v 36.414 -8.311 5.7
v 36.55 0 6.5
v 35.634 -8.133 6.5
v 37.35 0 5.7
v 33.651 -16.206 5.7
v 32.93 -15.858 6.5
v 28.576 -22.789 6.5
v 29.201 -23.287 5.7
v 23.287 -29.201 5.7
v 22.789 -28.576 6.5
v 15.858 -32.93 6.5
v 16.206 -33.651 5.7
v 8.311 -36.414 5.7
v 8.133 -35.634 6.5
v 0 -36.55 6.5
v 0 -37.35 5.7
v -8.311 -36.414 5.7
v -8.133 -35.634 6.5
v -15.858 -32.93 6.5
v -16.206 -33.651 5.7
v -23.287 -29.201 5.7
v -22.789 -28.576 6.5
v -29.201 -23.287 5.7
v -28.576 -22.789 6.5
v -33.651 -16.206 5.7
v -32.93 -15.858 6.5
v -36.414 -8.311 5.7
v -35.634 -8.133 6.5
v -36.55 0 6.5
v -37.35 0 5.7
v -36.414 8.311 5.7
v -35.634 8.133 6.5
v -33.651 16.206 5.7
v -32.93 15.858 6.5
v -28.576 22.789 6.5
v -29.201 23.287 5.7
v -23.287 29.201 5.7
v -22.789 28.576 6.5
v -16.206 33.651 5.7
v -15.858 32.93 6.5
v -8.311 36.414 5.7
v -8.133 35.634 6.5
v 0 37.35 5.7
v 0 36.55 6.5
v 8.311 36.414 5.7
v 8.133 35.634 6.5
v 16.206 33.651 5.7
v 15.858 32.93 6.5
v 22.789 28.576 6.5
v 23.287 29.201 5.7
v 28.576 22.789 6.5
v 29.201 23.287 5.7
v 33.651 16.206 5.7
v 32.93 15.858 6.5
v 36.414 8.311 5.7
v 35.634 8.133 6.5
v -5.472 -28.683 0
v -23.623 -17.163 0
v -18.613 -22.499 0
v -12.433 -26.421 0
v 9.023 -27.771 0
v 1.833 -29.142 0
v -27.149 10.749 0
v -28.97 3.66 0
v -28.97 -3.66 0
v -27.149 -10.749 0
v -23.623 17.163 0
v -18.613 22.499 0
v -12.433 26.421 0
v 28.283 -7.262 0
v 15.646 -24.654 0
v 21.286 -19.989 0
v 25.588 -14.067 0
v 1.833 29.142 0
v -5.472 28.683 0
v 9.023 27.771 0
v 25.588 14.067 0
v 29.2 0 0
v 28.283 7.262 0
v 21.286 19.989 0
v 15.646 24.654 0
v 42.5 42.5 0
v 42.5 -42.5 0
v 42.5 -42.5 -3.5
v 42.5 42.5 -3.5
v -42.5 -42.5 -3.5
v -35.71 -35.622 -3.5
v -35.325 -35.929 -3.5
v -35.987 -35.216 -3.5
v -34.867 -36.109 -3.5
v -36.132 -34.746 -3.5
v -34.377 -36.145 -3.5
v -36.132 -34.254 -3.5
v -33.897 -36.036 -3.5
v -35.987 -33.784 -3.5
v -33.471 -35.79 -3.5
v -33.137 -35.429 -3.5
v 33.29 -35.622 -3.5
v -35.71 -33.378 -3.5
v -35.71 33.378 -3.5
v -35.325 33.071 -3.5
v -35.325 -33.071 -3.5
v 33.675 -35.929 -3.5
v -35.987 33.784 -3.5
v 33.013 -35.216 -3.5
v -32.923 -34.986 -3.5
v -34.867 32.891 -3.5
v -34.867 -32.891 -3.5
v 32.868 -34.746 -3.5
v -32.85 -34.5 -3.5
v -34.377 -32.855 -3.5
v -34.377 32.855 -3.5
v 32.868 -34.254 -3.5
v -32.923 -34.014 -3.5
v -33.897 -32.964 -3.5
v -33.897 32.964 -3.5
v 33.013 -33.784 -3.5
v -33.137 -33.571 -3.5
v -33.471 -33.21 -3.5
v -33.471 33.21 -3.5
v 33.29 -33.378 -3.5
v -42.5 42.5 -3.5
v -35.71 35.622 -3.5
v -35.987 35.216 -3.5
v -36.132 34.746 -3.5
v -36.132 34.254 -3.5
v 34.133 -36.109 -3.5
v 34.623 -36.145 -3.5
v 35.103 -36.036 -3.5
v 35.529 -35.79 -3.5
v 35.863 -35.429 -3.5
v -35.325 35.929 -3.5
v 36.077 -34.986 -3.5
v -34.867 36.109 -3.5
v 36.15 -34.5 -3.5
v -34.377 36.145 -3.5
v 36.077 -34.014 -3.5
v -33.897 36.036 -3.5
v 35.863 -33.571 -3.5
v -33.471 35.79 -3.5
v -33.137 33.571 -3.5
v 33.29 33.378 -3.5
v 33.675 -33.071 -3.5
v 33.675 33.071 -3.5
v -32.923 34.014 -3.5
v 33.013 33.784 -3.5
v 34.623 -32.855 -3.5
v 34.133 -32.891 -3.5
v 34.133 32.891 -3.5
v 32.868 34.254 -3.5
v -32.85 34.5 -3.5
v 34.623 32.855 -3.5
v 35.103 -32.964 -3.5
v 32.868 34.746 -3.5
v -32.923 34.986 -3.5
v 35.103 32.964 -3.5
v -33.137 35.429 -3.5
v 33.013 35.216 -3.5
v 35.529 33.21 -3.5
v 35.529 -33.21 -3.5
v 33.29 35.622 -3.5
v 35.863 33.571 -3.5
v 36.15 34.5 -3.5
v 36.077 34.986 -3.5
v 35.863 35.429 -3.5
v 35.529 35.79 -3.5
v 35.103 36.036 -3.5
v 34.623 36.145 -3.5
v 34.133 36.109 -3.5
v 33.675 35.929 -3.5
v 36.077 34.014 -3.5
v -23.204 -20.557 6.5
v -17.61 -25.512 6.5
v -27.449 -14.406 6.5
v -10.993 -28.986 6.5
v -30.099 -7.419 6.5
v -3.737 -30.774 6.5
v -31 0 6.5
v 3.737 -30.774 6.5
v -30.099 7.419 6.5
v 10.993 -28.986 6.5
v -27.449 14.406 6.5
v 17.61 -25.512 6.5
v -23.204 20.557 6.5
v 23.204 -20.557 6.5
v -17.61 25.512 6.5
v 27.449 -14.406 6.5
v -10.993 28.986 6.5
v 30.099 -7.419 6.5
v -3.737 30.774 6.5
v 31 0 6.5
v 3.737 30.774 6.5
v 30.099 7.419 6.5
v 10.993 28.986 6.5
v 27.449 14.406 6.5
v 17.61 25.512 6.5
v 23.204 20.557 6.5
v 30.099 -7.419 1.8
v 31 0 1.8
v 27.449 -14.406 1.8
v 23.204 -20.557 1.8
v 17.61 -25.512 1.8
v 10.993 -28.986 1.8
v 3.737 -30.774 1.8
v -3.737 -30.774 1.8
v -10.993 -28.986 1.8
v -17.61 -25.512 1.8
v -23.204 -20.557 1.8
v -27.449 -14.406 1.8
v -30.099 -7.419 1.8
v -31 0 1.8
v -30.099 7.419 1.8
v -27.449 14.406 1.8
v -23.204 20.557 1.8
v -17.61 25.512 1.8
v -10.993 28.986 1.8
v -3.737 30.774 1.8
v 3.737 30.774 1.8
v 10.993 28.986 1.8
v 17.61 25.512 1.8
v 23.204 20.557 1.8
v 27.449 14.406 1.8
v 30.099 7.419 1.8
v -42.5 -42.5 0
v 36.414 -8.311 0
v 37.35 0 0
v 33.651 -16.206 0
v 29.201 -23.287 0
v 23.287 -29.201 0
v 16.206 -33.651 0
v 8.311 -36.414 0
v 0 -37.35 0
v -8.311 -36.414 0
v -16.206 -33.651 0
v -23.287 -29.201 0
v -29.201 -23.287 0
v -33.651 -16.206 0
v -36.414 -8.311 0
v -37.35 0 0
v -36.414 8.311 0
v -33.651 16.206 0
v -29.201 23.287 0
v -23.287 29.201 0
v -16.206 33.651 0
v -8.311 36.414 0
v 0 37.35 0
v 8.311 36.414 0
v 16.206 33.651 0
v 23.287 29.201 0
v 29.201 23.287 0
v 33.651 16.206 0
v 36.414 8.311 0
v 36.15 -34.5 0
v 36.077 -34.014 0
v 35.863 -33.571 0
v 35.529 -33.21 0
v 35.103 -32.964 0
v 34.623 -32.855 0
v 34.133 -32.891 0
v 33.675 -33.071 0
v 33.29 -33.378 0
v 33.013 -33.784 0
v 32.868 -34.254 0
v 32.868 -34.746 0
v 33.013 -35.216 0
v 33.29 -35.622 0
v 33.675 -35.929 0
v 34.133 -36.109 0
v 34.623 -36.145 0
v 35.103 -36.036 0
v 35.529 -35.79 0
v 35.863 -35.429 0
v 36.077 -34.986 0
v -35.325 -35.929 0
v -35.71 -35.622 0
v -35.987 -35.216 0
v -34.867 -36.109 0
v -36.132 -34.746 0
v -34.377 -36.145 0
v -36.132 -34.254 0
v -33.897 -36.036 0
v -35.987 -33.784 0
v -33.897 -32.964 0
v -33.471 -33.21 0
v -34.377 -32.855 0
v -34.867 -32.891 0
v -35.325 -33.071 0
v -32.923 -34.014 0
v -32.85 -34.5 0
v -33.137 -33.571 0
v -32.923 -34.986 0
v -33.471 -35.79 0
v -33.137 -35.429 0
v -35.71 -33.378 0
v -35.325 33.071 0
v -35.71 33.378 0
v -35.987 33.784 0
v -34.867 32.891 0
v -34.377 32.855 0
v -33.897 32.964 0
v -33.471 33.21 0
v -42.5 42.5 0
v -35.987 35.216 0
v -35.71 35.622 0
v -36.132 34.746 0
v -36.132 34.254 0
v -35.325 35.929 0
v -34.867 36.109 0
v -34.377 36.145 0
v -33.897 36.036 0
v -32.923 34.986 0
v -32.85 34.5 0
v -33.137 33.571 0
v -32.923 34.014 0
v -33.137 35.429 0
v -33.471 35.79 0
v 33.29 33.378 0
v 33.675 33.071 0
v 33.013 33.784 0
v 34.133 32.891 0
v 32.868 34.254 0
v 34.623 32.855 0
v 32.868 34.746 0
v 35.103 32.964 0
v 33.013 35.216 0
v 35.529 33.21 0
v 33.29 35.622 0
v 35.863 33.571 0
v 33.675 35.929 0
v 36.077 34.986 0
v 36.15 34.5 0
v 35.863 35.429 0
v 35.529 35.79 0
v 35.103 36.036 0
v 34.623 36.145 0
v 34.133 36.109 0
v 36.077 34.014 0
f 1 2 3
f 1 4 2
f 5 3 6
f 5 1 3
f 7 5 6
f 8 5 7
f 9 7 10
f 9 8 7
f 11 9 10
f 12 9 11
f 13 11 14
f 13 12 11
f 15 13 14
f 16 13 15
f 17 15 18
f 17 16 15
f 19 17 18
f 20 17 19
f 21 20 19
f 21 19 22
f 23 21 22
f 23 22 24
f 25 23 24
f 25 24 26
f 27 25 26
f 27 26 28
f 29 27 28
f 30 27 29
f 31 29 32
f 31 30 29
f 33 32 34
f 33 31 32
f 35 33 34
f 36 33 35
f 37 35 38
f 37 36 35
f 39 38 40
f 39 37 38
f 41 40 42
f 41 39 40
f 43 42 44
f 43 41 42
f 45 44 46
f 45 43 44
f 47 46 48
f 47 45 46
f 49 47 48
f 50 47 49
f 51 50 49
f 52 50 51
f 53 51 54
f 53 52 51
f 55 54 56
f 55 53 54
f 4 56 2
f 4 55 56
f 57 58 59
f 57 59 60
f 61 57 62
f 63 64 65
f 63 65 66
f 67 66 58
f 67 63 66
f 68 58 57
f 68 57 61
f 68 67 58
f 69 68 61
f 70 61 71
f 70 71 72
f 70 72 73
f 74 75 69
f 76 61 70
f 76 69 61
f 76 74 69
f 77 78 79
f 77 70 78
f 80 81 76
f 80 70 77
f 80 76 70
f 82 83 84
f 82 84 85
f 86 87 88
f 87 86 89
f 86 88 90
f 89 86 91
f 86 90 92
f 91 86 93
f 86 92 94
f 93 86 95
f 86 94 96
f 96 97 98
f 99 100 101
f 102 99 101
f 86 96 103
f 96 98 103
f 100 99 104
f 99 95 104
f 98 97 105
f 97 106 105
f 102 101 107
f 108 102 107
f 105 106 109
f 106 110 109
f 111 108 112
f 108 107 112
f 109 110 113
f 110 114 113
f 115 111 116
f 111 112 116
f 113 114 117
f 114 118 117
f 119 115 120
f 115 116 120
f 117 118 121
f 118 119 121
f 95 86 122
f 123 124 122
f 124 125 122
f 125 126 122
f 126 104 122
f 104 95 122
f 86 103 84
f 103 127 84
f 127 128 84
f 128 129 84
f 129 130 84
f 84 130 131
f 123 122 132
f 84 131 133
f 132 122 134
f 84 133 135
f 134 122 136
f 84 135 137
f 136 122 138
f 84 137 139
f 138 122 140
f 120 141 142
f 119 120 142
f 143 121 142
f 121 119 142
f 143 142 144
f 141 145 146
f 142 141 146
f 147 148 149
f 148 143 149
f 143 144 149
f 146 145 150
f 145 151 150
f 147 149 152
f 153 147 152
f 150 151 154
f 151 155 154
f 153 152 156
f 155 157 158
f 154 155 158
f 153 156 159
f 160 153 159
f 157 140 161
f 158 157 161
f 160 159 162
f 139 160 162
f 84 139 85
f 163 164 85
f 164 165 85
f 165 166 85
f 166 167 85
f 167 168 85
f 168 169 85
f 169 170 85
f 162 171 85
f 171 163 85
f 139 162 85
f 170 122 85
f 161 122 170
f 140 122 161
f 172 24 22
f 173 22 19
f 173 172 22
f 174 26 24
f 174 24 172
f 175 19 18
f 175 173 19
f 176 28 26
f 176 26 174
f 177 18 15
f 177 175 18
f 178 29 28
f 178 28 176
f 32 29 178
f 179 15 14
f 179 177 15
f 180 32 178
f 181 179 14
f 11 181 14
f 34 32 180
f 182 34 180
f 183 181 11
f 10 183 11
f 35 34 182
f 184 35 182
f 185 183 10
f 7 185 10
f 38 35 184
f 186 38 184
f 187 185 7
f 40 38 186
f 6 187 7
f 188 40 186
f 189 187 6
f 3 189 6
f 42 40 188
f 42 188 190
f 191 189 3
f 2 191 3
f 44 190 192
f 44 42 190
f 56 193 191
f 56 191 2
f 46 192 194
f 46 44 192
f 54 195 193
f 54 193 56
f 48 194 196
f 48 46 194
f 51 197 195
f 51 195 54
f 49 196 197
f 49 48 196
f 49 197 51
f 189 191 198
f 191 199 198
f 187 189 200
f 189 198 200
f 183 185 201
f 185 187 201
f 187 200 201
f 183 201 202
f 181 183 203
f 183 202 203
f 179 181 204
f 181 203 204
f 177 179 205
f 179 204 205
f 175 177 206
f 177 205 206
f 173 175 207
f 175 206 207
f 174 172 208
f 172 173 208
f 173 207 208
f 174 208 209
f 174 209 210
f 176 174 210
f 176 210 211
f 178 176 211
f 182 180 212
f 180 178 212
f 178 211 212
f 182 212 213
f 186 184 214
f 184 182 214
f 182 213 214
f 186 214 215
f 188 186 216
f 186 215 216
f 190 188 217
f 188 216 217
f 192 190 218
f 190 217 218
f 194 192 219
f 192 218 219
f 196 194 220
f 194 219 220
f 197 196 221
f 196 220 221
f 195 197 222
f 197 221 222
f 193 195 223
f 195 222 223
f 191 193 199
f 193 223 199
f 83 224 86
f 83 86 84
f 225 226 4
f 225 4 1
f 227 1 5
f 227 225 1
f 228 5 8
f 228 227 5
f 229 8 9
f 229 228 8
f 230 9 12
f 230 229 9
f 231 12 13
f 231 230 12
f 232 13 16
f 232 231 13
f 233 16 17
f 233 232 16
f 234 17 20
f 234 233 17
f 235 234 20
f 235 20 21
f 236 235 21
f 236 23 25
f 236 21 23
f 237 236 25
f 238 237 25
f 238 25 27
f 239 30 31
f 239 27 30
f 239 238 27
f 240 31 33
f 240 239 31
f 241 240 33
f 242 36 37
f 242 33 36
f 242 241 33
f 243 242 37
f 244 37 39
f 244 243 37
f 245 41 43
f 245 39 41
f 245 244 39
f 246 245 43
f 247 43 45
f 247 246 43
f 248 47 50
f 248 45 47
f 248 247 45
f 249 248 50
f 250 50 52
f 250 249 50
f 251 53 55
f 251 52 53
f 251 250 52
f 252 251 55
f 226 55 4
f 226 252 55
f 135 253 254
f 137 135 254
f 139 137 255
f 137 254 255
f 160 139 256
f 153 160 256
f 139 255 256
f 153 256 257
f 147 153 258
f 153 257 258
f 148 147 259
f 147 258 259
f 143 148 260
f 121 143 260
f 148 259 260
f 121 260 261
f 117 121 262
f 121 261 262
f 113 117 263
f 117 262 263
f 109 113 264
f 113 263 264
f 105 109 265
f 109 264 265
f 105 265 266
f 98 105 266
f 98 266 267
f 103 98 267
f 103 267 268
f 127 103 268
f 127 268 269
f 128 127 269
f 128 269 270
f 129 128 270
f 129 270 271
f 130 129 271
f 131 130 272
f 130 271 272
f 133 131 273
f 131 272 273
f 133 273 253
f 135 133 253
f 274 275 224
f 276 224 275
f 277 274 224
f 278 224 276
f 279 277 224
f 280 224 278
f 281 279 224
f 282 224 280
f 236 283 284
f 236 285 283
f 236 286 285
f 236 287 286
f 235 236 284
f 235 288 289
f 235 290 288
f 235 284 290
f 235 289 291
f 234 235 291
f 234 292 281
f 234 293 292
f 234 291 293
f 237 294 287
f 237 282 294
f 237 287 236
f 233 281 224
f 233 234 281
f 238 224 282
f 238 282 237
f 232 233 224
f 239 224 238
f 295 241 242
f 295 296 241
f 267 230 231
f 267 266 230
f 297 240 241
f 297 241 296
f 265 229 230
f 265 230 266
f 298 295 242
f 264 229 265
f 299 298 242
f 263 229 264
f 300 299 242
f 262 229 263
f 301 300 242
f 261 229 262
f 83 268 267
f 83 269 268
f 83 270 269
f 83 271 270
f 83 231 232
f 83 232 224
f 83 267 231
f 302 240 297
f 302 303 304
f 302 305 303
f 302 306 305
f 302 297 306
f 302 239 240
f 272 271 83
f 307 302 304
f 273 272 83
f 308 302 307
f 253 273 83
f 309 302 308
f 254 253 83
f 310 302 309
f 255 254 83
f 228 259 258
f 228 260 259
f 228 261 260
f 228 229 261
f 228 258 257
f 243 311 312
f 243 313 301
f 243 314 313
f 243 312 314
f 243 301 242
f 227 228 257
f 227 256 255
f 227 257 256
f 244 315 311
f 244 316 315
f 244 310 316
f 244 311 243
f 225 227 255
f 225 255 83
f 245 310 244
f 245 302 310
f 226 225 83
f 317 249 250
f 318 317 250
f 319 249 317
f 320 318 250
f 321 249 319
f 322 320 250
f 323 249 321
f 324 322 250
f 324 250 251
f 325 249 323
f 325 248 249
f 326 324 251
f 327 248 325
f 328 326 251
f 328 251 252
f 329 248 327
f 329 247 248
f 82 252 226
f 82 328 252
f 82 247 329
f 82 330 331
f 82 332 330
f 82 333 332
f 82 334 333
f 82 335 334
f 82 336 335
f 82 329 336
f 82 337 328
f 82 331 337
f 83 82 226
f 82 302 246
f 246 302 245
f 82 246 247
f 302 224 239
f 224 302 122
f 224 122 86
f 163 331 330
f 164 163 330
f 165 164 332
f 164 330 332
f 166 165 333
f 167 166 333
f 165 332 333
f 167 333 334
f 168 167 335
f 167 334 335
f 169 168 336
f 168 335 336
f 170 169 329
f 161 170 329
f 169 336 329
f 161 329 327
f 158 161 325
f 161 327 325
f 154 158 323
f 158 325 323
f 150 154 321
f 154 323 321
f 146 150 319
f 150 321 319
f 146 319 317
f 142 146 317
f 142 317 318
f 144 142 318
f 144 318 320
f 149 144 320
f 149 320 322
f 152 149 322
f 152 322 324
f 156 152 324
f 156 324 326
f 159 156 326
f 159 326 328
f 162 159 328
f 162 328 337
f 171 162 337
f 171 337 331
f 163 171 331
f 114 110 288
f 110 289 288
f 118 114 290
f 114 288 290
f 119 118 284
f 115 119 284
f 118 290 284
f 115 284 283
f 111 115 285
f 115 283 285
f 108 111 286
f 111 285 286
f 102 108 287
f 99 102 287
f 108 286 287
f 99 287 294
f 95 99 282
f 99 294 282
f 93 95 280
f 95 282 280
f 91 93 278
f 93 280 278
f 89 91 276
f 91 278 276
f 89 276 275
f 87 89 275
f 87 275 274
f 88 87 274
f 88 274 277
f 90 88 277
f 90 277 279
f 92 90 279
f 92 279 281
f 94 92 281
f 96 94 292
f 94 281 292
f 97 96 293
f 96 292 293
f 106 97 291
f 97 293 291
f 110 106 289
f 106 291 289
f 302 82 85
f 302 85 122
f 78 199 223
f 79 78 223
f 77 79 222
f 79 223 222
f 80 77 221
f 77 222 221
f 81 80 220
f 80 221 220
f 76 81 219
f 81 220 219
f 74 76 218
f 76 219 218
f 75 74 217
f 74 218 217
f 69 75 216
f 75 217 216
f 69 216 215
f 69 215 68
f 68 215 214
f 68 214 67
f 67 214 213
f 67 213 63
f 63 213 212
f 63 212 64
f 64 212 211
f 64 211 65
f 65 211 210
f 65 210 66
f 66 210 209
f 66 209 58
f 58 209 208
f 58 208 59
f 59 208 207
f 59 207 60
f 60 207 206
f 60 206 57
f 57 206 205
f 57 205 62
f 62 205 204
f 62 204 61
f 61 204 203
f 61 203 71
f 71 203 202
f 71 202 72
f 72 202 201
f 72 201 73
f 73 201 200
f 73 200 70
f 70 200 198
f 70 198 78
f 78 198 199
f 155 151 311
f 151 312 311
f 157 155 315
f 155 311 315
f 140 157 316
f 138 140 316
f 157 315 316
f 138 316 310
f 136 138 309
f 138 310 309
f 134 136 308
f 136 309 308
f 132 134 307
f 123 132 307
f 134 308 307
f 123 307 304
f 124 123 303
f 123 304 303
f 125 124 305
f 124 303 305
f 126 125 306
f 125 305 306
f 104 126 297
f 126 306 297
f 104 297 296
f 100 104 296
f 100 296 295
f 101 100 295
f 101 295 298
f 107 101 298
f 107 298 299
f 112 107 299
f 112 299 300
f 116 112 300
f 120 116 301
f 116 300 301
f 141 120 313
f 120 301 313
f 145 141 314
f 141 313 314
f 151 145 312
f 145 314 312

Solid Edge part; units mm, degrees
sketch "Sketch1" plane through (0, 0, 0) normal (0, 0, 1) x (1, 0, 0)
  circle A0 centre (34.5, 34.5) radius 1.65
  circle A1 centre (-34.5, 34.5) radius 1.65
  circle A2 centre (-34.5, -34.5) radius 1.65
  circle A3 centre (34.5, -34.5) radius 1.65
  line L0 (42.5, 42.5) -> (-42.5, 42.5)
  line L1 (-42.5, 42.5) -> (-42.5, -42.5)
  line L2 (-42.5, -42.5) -> (42.5, -42.5)
  line L3 (42.5, -42.5) -> (42.5, 42.5)
extrude "Protrusion1" add sketch "Sketch1" against normal blind 3.5
sketch "Sketch2" plane through (0, 0, 0) normal (0, 0, 1) x (1, 0, 0)
  circle A0 centre (0, 0) radius 31
  circle A1 centre (0, 0) radius 37.35
extrude "ExtrudedProtrusion_2" add sketch "Sketch2" along normal blind 6.5
chamfer "Chamfer_1" distance 0.8 angle 45 1 edges at (-37.35, 0, 6.5)
chamfer "Chamfer_2" distance 1.8 angle 45 1 edges at (-31, 0, 0)
